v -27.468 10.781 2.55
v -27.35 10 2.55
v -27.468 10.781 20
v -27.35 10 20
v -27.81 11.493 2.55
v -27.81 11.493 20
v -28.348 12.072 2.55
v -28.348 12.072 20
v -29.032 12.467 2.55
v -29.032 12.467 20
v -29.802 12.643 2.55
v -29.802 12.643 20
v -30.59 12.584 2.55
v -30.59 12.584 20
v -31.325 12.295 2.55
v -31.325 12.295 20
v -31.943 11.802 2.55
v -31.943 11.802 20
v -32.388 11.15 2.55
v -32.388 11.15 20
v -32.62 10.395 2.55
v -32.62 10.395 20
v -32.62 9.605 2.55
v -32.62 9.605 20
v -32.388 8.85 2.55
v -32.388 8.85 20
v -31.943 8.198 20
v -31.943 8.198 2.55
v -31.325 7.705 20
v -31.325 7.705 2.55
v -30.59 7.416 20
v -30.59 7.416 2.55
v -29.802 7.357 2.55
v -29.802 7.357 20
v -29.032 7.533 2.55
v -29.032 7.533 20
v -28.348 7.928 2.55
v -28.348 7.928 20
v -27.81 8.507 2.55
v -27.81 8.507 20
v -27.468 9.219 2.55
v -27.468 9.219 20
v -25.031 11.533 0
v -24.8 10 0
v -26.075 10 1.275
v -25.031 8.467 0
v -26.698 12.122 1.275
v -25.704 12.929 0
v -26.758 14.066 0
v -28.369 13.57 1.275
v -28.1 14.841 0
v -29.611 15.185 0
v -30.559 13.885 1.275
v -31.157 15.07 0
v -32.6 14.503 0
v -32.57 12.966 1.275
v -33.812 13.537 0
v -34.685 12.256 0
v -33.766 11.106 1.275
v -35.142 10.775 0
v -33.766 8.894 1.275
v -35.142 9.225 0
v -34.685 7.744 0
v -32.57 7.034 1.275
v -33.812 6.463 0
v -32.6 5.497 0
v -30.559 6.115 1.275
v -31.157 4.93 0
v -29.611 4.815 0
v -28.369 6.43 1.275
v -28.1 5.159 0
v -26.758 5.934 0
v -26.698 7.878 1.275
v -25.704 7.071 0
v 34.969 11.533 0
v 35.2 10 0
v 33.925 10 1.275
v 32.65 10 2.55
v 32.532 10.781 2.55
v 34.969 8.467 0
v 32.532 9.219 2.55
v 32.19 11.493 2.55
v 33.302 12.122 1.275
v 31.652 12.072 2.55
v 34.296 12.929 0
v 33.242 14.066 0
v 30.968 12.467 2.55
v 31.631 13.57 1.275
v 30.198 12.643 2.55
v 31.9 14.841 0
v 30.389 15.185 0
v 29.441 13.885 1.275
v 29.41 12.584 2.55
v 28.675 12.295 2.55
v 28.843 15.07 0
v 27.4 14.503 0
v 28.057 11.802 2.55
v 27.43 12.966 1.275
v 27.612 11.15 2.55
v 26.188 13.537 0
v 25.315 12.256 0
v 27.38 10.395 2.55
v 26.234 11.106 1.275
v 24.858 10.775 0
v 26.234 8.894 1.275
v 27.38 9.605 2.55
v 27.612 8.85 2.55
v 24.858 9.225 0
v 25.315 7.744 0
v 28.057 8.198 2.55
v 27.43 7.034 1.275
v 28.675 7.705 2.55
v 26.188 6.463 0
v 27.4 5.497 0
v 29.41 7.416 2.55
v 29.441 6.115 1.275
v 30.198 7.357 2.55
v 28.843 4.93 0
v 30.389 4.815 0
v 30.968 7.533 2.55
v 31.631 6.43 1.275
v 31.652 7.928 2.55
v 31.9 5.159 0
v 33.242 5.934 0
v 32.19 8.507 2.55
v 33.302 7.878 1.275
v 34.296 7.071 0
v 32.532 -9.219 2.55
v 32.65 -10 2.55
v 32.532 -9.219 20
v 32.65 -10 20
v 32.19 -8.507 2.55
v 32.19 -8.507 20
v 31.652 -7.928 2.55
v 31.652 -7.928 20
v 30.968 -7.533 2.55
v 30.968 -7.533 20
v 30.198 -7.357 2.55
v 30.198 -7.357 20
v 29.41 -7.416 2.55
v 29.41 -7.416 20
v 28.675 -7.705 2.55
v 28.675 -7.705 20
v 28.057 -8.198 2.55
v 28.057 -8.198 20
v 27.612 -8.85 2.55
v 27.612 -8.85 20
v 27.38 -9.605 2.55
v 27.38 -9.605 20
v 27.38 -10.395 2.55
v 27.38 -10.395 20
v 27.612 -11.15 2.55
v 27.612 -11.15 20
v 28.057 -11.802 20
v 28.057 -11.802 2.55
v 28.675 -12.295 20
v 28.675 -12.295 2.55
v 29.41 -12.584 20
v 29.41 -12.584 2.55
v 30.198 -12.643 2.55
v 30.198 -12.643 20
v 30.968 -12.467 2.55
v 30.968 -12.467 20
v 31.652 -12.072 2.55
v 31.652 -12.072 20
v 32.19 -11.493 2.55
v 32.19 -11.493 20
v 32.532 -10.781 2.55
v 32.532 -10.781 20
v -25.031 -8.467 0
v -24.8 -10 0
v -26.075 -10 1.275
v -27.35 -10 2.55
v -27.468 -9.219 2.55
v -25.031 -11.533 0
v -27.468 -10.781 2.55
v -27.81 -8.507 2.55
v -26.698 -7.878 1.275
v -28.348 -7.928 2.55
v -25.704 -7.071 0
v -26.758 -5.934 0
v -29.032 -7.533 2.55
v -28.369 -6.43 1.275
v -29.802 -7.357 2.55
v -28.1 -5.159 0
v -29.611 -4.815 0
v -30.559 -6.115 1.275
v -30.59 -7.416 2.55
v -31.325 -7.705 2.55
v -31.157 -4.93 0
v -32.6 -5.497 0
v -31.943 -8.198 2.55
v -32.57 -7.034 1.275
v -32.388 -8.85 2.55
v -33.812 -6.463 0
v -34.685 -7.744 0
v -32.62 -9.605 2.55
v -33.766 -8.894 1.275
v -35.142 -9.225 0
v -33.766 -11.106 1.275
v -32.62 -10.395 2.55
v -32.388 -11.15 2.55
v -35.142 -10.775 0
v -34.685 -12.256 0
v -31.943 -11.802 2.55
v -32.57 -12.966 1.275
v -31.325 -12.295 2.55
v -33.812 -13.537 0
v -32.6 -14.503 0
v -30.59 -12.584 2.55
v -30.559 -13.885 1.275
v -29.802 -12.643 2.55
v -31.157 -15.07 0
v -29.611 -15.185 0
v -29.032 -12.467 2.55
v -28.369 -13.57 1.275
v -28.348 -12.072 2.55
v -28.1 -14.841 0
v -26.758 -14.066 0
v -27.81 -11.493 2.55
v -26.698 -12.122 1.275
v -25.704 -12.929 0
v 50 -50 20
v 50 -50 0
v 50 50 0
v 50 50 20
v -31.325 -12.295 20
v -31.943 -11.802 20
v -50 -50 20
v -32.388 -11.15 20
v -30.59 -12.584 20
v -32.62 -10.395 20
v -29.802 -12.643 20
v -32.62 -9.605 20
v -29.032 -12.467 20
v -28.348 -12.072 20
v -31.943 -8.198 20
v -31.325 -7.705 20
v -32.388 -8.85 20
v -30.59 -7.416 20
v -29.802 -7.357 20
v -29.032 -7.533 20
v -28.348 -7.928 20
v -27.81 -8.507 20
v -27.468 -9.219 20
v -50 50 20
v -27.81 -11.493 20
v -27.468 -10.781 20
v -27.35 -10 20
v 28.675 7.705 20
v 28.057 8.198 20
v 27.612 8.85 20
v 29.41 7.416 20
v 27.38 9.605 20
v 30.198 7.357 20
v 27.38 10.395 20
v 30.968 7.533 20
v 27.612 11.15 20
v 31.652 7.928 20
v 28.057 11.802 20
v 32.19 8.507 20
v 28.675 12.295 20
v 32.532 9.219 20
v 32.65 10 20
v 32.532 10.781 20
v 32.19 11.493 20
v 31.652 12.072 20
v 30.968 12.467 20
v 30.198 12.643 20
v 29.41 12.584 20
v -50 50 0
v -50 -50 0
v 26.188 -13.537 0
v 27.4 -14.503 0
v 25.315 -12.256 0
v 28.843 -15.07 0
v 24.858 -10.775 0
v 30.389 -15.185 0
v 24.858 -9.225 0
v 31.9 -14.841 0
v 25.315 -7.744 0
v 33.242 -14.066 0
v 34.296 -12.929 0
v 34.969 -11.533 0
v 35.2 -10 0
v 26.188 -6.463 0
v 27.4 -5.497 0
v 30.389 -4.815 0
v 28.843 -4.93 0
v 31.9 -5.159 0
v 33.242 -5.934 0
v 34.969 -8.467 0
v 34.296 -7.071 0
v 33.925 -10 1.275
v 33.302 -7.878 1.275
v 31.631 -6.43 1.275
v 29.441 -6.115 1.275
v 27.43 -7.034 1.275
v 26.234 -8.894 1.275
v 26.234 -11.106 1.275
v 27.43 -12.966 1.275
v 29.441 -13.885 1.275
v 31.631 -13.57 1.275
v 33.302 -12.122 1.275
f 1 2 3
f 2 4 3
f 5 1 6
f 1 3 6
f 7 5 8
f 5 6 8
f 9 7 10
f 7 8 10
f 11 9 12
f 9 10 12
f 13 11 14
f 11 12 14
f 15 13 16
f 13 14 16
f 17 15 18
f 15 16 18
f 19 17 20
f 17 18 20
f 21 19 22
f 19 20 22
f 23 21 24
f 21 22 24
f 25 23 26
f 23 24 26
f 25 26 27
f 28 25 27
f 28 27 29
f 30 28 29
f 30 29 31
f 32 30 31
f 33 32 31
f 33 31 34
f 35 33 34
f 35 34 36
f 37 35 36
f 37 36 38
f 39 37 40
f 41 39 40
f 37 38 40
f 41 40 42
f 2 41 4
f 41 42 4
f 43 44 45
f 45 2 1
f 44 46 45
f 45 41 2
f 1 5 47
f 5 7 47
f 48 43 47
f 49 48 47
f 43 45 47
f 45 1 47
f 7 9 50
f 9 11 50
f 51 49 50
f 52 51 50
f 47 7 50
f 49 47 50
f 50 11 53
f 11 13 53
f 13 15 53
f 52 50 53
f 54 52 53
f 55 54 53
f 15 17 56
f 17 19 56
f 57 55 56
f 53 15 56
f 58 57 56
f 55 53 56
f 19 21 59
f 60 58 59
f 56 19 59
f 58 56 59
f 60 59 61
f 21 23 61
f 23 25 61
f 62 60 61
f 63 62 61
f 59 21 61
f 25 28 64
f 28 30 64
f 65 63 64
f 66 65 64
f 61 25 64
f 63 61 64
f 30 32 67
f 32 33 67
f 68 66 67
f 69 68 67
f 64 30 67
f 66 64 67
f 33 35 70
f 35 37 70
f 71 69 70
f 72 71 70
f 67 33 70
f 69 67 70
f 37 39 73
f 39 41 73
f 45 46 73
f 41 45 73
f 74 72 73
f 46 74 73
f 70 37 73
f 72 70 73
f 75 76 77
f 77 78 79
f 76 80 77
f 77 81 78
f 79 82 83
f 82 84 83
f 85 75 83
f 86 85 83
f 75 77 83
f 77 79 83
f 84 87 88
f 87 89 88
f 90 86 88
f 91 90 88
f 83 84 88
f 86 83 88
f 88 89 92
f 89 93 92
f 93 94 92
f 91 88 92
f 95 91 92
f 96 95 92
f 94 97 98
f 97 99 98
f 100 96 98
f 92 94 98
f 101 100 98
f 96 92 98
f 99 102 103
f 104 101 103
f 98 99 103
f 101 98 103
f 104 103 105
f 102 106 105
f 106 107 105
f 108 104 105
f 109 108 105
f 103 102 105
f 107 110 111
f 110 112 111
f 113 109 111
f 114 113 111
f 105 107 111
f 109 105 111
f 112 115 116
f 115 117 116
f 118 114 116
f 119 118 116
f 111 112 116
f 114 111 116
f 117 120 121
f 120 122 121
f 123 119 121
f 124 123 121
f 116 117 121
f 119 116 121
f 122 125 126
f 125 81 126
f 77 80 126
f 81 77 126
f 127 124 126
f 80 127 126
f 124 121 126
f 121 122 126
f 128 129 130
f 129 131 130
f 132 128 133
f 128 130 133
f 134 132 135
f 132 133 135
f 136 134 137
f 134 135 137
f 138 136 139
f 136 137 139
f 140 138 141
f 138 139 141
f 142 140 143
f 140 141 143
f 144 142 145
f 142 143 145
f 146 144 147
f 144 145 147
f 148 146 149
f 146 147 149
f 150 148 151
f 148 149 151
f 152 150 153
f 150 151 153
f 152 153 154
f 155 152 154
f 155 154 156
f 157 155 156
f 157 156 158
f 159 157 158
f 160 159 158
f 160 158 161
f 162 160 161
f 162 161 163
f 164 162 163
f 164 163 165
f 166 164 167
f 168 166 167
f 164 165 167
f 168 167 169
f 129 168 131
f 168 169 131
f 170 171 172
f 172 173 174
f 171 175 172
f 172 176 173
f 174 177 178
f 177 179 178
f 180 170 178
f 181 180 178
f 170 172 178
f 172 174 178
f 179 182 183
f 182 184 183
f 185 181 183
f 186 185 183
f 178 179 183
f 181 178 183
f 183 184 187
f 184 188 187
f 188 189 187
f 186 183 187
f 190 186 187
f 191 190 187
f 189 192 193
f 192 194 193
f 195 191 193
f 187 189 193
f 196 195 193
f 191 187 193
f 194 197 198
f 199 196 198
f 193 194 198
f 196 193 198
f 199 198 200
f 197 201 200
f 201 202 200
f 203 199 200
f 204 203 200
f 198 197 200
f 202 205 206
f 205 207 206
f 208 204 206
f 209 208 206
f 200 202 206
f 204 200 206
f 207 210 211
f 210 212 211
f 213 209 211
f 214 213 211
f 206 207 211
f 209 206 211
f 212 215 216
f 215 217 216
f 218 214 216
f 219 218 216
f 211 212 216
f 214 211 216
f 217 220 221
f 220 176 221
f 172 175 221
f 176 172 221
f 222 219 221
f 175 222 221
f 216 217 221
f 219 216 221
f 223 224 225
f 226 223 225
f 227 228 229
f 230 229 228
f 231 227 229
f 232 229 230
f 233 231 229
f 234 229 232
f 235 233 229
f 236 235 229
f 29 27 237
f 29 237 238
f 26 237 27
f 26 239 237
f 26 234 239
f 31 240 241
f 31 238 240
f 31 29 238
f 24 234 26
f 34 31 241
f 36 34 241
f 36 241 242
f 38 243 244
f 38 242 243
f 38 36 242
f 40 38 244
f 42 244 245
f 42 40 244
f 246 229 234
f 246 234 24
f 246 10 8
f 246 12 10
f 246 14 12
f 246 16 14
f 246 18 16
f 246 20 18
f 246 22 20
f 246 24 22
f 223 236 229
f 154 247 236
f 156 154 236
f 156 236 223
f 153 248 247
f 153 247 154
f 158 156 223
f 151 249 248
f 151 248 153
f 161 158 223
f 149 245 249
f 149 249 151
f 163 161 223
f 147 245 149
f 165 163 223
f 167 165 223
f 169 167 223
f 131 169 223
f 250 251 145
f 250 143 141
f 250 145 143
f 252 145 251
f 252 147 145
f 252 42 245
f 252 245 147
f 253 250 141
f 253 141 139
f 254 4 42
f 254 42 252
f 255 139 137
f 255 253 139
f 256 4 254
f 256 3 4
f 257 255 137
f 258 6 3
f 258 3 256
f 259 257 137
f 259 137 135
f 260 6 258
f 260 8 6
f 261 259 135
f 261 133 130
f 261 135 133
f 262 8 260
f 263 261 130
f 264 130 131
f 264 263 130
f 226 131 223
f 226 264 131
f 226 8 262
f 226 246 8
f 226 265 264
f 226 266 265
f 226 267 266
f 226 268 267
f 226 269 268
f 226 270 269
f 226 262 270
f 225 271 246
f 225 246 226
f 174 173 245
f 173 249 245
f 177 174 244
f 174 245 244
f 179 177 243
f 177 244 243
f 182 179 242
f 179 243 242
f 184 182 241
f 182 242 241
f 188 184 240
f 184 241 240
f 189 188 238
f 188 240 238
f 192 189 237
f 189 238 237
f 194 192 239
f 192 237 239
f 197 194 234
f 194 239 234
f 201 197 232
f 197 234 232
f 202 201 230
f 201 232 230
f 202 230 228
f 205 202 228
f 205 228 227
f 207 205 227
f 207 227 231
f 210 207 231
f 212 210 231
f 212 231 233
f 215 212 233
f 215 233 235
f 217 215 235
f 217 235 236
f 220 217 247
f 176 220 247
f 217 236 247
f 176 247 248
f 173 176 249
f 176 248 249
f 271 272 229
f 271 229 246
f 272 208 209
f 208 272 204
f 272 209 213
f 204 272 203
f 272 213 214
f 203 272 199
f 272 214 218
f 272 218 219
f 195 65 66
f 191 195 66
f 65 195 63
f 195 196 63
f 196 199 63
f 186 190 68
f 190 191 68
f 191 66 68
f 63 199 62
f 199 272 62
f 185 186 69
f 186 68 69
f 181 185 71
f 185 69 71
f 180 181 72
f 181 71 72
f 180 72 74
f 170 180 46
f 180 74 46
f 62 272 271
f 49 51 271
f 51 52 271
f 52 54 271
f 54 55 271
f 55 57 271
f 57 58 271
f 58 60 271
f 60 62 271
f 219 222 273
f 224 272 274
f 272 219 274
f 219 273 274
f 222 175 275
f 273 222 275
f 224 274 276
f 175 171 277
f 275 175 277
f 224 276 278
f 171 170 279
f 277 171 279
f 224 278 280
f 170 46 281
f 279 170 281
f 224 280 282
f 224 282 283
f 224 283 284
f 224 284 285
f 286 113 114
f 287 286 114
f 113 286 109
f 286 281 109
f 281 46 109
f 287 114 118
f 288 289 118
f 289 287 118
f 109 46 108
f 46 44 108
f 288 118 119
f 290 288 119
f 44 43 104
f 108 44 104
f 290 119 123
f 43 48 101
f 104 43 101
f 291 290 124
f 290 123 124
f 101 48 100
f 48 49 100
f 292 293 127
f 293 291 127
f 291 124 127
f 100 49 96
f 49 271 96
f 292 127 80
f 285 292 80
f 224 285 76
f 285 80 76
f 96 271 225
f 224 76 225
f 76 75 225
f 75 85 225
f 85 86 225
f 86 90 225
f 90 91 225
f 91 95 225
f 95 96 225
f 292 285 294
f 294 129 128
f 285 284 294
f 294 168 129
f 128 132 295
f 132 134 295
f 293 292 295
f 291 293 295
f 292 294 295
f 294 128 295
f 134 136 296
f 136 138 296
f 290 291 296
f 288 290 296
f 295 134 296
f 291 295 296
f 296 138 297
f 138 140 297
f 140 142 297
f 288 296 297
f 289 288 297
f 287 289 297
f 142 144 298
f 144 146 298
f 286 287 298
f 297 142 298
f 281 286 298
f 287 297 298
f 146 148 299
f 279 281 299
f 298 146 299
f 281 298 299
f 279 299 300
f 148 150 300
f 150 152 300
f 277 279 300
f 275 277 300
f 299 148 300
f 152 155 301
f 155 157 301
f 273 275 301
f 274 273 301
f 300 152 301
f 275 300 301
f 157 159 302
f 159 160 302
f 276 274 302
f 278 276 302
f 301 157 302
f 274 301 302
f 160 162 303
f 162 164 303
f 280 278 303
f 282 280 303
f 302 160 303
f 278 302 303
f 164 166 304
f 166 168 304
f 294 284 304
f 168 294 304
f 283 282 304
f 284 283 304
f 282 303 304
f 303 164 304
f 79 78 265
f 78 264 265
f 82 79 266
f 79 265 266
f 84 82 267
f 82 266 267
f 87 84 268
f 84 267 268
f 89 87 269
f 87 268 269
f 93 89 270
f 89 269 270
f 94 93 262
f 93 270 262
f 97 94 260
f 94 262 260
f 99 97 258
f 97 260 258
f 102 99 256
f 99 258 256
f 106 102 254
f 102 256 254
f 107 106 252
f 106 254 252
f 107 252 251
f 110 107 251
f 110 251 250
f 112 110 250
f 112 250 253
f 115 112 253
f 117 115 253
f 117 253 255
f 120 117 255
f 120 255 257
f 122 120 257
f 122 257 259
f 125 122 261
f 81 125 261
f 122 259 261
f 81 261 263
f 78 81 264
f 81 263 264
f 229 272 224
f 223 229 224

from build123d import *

# Parameters (mm, degrees)
SKETCH1_W                                       = 100
SKETCH1_H                                       = 100
BOSS_EXTRUDE1_DEPTH                             = 20
CSK_FOR_M5_FLAT_HEAD_MACHINE_SCREW1_D           = 5.3
CSK_FOR_M5_FLAT_HEAD_MACHINE_SCREW1_CSINK_D     = 10.4
CSK_FOR_M5_FLAT_HEAD_MACHINE_SCREW1_CSINK_ANGLE = 90


with BuildPart() as part:
    # Sketch1 → Boss-Extrude1 (new body)
    with BuildSketch(Plane.XY):
        Rectangle(SKETCH1_W, SKETCH1_H)
    extrude(amount=BOSS_EXTRUDE1_DEPTH)

    # CSK for M5 Flat Head Machine Screw1 (through all)
    with Locations(Plane(origin=(0, 0, 0), x_dir=(-1, 0, 0), z_dir=(0, 0, -1))):
        with Locations((-30, 10), (30, 10), (30, -10), (-30, -10)):
            CounterSinkHole(CSK_FOR_M5_FLAT_HEAD_MACHINE_SCREW1_D / 2, CSK_FOR_M5_FLAT_HEAD_MACHINE_SCREW1_CSINK_D / 2, counter_sink_angle=CSK_FOR_M5_FLAT_HEAD_MACHINE_SCREW1_CSINK_ANGLE)


solid = part.part
